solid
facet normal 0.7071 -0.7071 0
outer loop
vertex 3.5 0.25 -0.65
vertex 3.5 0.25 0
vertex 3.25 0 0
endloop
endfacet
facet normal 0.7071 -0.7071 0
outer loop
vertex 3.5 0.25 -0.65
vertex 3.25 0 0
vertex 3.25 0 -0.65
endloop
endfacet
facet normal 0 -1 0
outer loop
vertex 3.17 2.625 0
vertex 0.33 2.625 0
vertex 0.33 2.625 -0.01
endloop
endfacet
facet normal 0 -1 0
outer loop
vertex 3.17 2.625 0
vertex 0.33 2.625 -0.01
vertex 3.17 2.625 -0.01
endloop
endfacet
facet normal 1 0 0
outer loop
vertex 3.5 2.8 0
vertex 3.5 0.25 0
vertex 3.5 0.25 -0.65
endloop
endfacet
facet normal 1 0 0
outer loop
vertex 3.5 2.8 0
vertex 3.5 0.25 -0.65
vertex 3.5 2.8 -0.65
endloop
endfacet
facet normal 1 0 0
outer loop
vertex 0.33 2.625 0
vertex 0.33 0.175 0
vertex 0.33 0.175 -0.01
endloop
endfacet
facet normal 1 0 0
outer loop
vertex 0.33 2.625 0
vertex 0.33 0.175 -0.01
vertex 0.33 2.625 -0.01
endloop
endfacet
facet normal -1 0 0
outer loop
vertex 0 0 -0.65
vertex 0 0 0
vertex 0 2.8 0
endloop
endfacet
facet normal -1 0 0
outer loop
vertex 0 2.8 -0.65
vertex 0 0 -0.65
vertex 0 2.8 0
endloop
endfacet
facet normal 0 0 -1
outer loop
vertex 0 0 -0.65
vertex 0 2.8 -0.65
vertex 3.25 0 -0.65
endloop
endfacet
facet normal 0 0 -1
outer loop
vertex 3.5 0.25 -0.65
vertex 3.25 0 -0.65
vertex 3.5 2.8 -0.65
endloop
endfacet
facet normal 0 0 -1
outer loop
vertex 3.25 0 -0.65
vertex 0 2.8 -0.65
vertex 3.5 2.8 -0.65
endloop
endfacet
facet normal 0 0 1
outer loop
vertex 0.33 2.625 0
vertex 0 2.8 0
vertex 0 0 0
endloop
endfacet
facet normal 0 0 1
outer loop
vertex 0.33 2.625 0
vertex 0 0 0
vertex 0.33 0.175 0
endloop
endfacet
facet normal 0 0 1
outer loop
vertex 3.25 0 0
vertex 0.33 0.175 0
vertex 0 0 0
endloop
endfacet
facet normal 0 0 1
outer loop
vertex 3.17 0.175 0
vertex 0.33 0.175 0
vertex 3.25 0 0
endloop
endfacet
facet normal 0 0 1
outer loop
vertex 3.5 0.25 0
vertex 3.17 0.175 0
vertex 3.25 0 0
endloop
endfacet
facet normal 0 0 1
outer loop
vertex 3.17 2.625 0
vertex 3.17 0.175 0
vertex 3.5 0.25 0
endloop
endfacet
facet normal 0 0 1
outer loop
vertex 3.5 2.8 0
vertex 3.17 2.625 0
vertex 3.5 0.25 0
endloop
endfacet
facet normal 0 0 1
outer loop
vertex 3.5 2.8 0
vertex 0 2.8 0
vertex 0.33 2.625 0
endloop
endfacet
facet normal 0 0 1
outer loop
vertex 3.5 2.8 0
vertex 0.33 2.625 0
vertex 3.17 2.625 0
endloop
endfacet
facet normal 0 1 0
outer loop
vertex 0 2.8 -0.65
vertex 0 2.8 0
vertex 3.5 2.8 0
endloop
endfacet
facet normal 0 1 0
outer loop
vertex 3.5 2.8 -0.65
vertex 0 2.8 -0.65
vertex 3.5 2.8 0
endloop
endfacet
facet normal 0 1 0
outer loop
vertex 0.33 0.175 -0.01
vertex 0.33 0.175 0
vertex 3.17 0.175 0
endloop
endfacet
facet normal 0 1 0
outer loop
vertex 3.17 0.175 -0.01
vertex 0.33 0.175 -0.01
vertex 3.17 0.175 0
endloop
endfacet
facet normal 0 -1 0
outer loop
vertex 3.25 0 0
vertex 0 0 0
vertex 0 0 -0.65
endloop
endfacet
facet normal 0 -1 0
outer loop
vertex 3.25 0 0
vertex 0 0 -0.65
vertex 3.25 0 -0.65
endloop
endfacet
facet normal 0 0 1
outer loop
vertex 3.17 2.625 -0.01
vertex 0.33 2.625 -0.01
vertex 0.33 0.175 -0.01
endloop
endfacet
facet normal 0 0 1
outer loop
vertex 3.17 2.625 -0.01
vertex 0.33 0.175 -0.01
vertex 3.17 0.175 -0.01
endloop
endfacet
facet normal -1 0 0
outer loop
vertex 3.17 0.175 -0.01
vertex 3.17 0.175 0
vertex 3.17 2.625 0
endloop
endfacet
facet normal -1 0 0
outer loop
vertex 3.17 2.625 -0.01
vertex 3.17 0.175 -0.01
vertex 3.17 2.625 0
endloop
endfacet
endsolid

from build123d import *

# Parameters (mm, degrees)
F0_W     = 3.5
F0_H     = 2.8
F1_DEPTH = 0.65
F2_W     = 2.84
F2_H     = 2.45
F3_DEPTH = 0.01
F4_SIZE  = 0.25


with BuildPart() as f1:
    # F0 (on Top) → F1 (new body)
    with BuildSketch(Plane.XY):
        with Locations((1.75, 1.4)):
            Rectangle(F0_W, F0_H)
    extrude(amount=-F1_DEPTH)

    # F2 (on face) → F3 (cut)
    with BuildSketch(Plane.XY):
        with Locations((1.75, 1.4)):
            Rectangle(F2_W, F2_H)
    extrude(amount=-F3_DEPTH, mode=Mode.SUBTRACT)

    # F4
    f4_edges = [f1.edges().sort_by_distance(p)[0] for p in [
        (3.5, 0, -0.325),
    ]]
    chamfer(f4_edges, length=F4_SIZE)


solid = f1.part
